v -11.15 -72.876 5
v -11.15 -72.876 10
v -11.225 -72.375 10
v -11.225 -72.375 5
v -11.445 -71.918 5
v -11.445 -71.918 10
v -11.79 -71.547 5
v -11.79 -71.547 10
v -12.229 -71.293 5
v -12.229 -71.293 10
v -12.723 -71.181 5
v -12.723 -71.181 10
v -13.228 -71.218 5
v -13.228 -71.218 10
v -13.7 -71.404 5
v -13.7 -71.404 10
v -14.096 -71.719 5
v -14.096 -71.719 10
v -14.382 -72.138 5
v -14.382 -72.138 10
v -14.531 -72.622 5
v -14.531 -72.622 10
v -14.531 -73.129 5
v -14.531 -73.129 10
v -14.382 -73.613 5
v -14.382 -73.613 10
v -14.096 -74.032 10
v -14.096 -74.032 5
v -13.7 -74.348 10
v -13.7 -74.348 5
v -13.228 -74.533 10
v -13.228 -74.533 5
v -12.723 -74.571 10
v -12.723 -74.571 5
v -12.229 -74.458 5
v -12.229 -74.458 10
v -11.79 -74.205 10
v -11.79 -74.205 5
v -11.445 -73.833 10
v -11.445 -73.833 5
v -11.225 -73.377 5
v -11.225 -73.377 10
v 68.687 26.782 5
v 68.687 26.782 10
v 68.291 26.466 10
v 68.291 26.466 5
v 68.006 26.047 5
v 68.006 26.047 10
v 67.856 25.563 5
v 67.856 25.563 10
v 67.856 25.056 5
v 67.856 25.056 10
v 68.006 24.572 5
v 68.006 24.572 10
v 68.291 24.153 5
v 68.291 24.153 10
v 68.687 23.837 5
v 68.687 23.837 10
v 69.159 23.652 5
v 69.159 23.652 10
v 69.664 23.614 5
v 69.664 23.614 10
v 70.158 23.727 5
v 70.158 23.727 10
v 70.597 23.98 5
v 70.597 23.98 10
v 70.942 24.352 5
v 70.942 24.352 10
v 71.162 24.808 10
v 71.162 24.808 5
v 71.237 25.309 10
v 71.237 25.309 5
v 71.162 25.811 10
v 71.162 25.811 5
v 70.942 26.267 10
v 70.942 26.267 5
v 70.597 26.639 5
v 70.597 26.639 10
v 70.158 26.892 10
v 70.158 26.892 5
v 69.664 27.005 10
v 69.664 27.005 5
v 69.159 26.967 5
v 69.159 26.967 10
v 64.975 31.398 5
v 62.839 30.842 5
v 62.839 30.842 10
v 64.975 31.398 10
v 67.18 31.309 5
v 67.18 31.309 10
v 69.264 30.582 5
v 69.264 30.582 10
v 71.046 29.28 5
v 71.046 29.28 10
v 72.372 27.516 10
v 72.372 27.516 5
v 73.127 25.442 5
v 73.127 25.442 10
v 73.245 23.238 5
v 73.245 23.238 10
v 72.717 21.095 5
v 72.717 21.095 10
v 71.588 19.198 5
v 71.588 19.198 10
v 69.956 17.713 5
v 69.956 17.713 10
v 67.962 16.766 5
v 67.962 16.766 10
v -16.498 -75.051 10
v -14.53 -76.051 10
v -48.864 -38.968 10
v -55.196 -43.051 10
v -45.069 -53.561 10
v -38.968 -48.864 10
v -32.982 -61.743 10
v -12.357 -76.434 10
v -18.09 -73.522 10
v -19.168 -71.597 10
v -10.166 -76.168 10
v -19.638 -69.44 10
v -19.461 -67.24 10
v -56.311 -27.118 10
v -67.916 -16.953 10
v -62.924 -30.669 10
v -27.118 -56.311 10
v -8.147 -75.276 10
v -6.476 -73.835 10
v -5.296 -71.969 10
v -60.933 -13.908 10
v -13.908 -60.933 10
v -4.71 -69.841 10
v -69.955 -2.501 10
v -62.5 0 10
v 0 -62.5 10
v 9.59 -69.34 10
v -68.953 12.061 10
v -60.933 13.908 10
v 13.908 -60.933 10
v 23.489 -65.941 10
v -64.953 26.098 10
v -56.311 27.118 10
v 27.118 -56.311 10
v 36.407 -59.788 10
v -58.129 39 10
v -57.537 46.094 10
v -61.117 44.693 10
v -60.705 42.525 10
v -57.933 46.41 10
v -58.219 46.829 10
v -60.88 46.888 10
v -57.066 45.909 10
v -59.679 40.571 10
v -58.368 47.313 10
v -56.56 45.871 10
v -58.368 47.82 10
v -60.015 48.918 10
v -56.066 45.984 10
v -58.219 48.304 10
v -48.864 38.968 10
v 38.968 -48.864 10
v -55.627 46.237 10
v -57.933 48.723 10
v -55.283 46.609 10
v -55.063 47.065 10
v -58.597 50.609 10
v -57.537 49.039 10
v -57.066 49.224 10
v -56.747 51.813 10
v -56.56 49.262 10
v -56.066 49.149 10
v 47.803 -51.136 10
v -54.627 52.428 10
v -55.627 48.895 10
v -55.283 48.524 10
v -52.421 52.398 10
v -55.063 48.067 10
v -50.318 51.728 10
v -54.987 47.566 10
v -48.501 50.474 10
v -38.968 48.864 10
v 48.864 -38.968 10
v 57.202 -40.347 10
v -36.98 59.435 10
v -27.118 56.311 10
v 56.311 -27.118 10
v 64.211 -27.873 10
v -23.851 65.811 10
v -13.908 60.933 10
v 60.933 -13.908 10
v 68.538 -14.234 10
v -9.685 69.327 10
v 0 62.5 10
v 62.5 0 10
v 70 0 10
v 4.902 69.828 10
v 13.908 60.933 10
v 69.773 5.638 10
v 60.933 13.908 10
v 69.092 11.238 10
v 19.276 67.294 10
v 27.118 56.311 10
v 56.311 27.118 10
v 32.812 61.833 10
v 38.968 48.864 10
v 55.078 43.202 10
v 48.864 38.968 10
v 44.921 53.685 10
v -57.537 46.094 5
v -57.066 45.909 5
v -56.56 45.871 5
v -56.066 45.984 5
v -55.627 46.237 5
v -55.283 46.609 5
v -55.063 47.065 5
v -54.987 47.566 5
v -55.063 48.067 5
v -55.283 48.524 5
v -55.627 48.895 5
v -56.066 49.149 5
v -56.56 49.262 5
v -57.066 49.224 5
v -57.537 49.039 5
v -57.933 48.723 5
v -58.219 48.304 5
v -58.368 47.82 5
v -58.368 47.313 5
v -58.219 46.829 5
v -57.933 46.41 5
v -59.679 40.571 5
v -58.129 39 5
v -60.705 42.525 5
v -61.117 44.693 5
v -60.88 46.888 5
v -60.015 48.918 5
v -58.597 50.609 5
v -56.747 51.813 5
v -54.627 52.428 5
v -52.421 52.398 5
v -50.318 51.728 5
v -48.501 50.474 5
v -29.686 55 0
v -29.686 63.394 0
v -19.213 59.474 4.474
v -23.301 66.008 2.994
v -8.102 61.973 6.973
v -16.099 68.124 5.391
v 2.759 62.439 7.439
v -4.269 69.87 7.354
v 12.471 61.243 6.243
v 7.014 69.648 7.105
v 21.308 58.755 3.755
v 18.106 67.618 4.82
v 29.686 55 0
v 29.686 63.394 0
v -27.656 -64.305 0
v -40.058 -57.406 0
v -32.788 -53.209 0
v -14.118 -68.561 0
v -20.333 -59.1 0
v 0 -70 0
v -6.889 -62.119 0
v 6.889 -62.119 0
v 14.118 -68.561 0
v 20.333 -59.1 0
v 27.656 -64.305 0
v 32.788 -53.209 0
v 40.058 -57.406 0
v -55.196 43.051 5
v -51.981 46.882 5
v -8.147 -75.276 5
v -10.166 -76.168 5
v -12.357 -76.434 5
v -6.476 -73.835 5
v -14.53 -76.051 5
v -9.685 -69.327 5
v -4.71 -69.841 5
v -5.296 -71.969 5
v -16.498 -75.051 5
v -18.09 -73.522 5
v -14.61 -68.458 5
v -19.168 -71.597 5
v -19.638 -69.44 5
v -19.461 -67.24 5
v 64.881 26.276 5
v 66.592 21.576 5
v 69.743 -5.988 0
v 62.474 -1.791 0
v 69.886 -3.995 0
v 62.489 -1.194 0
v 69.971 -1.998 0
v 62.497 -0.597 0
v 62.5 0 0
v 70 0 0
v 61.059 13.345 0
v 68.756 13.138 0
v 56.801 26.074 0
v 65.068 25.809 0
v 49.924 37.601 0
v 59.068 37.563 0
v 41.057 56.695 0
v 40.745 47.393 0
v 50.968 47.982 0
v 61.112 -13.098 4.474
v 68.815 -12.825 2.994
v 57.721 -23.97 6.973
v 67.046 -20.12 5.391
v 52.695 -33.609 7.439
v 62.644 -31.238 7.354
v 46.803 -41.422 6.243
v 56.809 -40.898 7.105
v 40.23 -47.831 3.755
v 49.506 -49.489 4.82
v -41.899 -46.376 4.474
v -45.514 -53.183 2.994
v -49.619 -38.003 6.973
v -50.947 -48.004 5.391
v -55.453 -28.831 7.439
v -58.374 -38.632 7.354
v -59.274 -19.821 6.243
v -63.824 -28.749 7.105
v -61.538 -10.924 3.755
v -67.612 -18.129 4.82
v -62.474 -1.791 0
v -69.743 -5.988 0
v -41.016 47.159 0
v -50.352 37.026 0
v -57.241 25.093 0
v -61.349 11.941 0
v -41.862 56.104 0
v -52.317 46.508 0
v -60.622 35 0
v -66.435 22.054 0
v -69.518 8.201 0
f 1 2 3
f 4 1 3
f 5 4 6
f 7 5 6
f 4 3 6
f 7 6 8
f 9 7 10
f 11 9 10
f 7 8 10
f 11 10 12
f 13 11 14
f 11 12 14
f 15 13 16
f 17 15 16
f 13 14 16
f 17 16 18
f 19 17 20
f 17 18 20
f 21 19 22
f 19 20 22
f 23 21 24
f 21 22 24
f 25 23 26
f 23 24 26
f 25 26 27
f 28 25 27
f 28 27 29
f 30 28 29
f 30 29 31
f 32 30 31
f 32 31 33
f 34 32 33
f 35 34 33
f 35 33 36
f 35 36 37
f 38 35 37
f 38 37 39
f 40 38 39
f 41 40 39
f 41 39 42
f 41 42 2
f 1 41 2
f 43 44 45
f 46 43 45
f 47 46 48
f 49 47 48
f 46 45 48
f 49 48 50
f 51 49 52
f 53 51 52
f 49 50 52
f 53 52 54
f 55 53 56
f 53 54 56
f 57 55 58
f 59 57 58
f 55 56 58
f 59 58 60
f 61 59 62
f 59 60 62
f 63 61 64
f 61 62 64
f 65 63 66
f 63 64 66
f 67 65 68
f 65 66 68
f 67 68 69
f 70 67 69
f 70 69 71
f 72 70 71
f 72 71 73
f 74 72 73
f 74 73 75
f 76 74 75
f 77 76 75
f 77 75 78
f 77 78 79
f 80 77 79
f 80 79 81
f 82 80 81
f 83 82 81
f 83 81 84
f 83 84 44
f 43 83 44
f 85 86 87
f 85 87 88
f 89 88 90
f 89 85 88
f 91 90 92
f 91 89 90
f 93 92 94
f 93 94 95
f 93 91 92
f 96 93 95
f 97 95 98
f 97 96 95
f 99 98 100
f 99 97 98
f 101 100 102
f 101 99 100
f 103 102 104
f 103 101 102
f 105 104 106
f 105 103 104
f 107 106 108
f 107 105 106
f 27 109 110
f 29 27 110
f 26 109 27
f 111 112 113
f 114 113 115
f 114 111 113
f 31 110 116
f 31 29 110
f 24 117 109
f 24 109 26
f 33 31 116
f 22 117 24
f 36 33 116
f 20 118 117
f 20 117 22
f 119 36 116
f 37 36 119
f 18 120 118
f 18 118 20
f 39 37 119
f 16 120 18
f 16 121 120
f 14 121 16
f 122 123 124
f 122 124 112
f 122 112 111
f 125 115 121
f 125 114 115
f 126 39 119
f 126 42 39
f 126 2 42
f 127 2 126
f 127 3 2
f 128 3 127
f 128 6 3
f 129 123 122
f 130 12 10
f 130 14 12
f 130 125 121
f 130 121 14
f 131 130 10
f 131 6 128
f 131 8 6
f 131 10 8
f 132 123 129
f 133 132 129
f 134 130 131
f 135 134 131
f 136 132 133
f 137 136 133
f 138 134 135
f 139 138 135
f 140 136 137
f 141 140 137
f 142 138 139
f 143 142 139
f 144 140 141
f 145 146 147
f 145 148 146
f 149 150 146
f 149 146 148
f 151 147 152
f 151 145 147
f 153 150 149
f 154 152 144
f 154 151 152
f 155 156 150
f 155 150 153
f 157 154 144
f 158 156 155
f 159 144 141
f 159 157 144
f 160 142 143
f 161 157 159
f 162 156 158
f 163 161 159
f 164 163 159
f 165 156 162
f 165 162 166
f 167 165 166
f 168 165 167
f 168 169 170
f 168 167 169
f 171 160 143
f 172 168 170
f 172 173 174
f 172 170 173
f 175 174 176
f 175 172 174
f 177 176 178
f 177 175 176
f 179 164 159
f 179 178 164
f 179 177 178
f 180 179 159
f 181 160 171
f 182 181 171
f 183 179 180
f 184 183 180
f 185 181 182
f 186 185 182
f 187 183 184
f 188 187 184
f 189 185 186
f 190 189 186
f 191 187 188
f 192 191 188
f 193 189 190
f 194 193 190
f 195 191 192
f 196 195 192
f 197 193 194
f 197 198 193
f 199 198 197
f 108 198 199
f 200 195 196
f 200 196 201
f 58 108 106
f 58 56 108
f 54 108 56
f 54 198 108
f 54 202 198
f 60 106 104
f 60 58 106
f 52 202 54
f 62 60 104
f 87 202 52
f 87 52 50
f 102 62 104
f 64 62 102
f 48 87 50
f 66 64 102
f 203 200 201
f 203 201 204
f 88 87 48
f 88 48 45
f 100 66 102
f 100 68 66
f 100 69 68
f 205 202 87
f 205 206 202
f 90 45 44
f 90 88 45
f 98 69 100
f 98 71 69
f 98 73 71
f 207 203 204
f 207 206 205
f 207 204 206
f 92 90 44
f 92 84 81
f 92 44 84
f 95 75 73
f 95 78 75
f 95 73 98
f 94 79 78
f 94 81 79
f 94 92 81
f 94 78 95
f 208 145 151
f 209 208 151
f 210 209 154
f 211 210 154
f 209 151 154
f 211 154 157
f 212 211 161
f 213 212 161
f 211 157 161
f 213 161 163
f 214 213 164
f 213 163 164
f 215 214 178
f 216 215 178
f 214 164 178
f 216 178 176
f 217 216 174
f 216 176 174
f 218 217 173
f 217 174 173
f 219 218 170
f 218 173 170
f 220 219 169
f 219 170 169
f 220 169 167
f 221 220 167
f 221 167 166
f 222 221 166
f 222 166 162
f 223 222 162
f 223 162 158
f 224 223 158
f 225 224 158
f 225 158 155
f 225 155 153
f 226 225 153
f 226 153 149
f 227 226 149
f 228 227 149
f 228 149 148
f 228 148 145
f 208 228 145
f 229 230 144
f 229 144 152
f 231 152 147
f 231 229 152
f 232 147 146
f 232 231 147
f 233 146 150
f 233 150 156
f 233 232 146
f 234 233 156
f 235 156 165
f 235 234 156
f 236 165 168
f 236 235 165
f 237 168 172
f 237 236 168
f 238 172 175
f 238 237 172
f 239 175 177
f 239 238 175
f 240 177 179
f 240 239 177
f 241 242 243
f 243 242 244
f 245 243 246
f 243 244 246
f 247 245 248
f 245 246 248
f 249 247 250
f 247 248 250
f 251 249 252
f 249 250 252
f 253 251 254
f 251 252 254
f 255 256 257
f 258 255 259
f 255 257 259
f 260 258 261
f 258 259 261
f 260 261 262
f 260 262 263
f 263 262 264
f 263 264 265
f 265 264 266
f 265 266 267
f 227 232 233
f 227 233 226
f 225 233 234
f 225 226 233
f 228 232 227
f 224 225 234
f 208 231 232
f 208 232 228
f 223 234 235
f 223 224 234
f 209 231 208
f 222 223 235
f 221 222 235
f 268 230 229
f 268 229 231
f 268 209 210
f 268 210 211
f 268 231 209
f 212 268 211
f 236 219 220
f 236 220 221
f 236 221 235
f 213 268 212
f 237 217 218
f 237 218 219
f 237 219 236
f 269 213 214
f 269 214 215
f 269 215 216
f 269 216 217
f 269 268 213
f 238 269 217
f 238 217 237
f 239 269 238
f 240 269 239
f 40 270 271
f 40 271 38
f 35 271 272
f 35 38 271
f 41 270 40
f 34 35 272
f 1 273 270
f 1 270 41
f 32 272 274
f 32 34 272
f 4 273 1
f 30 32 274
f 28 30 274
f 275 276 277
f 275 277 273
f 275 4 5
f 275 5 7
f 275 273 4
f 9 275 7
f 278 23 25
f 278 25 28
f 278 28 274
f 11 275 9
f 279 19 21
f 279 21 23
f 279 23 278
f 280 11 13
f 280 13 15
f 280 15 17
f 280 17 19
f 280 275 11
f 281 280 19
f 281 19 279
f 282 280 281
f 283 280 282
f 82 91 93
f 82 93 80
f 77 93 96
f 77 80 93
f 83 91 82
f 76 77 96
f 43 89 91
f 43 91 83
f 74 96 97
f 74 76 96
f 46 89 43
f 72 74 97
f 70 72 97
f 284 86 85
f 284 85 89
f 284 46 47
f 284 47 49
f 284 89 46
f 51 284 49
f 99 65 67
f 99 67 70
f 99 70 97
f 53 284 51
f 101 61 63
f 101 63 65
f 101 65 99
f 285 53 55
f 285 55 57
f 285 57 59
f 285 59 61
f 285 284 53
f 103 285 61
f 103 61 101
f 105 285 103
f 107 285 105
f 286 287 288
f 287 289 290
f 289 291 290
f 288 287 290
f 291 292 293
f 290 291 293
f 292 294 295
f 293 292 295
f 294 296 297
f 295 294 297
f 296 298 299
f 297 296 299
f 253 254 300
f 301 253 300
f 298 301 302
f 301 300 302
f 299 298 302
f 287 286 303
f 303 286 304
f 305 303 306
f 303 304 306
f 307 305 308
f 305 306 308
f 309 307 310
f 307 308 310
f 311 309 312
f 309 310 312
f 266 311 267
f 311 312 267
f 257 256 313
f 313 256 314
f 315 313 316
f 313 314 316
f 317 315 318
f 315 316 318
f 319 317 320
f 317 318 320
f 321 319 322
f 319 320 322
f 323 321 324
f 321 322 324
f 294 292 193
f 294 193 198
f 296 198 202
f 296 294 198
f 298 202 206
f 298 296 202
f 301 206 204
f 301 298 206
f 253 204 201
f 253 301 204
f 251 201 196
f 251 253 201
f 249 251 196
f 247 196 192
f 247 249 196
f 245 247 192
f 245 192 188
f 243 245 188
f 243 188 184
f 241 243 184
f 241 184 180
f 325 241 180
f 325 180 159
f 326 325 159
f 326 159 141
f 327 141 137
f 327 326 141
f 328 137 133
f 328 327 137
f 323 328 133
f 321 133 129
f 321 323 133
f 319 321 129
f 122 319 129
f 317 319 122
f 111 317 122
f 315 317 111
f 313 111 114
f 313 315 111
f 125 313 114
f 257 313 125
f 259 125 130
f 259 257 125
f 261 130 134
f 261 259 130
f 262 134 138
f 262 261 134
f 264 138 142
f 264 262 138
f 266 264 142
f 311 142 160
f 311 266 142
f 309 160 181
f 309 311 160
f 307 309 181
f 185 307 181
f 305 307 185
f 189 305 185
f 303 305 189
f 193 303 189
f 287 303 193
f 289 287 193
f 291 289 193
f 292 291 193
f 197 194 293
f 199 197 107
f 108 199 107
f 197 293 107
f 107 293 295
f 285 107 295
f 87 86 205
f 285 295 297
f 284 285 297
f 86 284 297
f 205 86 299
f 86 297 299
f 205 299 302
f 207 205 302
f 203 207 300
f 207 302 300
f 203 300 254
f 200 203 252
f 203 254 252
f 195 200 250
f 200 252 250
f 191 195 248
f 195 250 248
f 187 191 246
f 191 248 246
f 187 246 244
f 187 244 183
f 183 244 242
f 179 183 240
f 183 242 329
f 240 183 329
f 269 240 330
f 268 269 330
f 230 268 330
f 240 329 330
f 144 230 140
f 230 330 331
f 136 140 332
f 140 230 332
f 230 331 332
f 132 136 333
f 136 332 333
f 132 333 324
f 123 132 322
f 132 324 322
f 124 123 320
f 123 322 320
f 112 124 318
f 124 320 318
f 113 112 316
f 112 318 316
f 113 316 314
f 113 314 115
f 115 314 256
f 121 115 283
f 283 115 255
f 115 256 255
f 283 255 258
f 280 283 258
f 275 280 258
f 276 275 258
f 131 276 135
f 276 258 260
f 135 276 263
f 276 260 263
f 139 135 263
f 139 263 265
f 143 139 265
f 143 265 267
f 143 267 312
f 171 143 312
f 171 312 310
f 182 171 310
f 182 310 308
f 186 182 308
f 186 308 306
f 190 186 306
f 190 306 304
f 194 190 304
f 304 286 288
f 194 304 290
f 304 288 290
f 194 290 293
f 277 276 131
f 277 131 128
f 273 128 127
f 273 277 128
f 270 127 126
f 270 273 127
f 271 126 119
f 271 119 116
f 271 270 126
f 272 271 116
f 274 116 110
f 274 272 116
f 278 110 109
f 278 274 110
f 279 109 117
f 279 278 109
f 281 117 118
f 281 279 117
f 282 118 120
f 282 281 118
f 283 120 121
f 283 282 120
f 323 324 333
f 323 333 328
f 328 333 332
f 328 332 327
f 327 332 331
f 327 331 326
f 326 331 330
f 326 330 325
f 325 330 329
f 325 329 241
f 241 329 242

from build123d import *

# Parameters (mm, degrees)
SCHIZZO1_R                   = 70
SCHIZZO1_R_2                 = 62.5
ESTRUSIONE_ESTRUSIONE1_DEPTH = 10
ESTRUSIONE_ESTRUSIONE3_START = -5
ESTRUSIONE_ESTRUSIONE3_DEPTH = 5
FORO_PER_VITE_M3_2_D         = 3.4
RIPETIZIONECIRCOLARE3_COUNT  = 3
SCHIZZO14_R                  = 62.5
TAGLIO_ESTRUSIONE1_DEPTH     = 30
RIPETIZIONECIRCOLARE4_COUNT  = 3


with BuildPart() as part:
    # Schizzo1 → Estrusione-Estrusione1 (new body)
    with BuildSketch(Plane.XY):
        Circle(SCHIZZO1_R)
        Circle(SCHIZZO1_R_2, mode=Mode.SUBTRACT)
    extrude(amount=ESTRUSIONE_ESTRUSIONE1_DEPTH)

    # Schizzo5 → Estrusione-Estrusione3 (add)
    with BuildSketch(Plane(origin=(0, 0, 0), x_dir=(-1, 0, 0), z_dir=(0, 0, -1)).offset(ESTRUSIONE_ESTRUSIONE3_START)):
        with BuildLine():
            ThreePointArc((4.710151164, -69.841352192), (13.457733769, -76.322600858), (19.461054995, -67.240369857))
            ThreePointArc((19.461054995, -67.240369857), (12.155372437, -68.936542711), (4.710151164, -69.841352192))
        make_face()
    estrusione_estrusione3 = extrude(amount=-ESTRUSIONE_ESTRUSIONE3_DEPTH)

    # Foro per Vite M3-2 (through all)
    with Locations(Plane(origin=(0, 0, 5), x_dir=(-1, 0, 0), z_dir=(0, 0, -1))):
        with Locations((12.849965147, -72.875773723)):
            foro_per_vite_m3_2 = Hole(FORO_PER_VITE_M3_2_D / 2)

    # RipetizioneCircolare3: Estrusione-Estrusione3, Foro per Vite M3-2 ×3 about axis
    ripetizionecircolare3_axis = Axis((0, 0, 0), (0, 0, 1))
    add([estrusione_estrusione3.rotate(ripetizionecircolare3_axis, i * 360 / RIPETIZIONECIRCOLARE3_COUNT) for i in range(1, RIPETIZIONECIRCOLARE3_COUNT)])
    add([foro_per_vite_m3_2.rotate(ripetizionecircolare3_axis, i * 360 / RIPETIZIONECIRCOLARE3_COUNT) for i in range(1, RIPETIZIONECIRCOLARE3_COUNT)], mode=Mode.SUBTRACT)

    # Schizzo14 → Taglio-Estrusione1 (cut)
    with BuildSketch(Plane(origin=(-60.621778265, -35, 0), x_dir=(0, 0, -1), z_dir=(-0.8660254037844398, -0.499999999999998, 0))):
        with Locations((55, 0)):
            Circle(SCHIZZO14_R)
    taglio_estrusione1 = extrude(amount=-TAGLIO_ESTRUSIONE1_DEPTH, mode=Mode.SUBTRACT)

    # RipetizioneCircolare4: Taglio-Estrusione1 ×3 about axis
    ripetizionecircolare4_axis = Axis((0, 0, 10), (0, 0, -1))
    for i in range(1, RIPETIZIONECIRCOLARE4_COUNT):
        add(taglio_estrusione1.rotate(ripetizionecircolare4_axis, i * 360 / RIPETIZIONECIRCOLARE4_COUNT), mode=Mode.SUBTRACT)


solid = part.part
